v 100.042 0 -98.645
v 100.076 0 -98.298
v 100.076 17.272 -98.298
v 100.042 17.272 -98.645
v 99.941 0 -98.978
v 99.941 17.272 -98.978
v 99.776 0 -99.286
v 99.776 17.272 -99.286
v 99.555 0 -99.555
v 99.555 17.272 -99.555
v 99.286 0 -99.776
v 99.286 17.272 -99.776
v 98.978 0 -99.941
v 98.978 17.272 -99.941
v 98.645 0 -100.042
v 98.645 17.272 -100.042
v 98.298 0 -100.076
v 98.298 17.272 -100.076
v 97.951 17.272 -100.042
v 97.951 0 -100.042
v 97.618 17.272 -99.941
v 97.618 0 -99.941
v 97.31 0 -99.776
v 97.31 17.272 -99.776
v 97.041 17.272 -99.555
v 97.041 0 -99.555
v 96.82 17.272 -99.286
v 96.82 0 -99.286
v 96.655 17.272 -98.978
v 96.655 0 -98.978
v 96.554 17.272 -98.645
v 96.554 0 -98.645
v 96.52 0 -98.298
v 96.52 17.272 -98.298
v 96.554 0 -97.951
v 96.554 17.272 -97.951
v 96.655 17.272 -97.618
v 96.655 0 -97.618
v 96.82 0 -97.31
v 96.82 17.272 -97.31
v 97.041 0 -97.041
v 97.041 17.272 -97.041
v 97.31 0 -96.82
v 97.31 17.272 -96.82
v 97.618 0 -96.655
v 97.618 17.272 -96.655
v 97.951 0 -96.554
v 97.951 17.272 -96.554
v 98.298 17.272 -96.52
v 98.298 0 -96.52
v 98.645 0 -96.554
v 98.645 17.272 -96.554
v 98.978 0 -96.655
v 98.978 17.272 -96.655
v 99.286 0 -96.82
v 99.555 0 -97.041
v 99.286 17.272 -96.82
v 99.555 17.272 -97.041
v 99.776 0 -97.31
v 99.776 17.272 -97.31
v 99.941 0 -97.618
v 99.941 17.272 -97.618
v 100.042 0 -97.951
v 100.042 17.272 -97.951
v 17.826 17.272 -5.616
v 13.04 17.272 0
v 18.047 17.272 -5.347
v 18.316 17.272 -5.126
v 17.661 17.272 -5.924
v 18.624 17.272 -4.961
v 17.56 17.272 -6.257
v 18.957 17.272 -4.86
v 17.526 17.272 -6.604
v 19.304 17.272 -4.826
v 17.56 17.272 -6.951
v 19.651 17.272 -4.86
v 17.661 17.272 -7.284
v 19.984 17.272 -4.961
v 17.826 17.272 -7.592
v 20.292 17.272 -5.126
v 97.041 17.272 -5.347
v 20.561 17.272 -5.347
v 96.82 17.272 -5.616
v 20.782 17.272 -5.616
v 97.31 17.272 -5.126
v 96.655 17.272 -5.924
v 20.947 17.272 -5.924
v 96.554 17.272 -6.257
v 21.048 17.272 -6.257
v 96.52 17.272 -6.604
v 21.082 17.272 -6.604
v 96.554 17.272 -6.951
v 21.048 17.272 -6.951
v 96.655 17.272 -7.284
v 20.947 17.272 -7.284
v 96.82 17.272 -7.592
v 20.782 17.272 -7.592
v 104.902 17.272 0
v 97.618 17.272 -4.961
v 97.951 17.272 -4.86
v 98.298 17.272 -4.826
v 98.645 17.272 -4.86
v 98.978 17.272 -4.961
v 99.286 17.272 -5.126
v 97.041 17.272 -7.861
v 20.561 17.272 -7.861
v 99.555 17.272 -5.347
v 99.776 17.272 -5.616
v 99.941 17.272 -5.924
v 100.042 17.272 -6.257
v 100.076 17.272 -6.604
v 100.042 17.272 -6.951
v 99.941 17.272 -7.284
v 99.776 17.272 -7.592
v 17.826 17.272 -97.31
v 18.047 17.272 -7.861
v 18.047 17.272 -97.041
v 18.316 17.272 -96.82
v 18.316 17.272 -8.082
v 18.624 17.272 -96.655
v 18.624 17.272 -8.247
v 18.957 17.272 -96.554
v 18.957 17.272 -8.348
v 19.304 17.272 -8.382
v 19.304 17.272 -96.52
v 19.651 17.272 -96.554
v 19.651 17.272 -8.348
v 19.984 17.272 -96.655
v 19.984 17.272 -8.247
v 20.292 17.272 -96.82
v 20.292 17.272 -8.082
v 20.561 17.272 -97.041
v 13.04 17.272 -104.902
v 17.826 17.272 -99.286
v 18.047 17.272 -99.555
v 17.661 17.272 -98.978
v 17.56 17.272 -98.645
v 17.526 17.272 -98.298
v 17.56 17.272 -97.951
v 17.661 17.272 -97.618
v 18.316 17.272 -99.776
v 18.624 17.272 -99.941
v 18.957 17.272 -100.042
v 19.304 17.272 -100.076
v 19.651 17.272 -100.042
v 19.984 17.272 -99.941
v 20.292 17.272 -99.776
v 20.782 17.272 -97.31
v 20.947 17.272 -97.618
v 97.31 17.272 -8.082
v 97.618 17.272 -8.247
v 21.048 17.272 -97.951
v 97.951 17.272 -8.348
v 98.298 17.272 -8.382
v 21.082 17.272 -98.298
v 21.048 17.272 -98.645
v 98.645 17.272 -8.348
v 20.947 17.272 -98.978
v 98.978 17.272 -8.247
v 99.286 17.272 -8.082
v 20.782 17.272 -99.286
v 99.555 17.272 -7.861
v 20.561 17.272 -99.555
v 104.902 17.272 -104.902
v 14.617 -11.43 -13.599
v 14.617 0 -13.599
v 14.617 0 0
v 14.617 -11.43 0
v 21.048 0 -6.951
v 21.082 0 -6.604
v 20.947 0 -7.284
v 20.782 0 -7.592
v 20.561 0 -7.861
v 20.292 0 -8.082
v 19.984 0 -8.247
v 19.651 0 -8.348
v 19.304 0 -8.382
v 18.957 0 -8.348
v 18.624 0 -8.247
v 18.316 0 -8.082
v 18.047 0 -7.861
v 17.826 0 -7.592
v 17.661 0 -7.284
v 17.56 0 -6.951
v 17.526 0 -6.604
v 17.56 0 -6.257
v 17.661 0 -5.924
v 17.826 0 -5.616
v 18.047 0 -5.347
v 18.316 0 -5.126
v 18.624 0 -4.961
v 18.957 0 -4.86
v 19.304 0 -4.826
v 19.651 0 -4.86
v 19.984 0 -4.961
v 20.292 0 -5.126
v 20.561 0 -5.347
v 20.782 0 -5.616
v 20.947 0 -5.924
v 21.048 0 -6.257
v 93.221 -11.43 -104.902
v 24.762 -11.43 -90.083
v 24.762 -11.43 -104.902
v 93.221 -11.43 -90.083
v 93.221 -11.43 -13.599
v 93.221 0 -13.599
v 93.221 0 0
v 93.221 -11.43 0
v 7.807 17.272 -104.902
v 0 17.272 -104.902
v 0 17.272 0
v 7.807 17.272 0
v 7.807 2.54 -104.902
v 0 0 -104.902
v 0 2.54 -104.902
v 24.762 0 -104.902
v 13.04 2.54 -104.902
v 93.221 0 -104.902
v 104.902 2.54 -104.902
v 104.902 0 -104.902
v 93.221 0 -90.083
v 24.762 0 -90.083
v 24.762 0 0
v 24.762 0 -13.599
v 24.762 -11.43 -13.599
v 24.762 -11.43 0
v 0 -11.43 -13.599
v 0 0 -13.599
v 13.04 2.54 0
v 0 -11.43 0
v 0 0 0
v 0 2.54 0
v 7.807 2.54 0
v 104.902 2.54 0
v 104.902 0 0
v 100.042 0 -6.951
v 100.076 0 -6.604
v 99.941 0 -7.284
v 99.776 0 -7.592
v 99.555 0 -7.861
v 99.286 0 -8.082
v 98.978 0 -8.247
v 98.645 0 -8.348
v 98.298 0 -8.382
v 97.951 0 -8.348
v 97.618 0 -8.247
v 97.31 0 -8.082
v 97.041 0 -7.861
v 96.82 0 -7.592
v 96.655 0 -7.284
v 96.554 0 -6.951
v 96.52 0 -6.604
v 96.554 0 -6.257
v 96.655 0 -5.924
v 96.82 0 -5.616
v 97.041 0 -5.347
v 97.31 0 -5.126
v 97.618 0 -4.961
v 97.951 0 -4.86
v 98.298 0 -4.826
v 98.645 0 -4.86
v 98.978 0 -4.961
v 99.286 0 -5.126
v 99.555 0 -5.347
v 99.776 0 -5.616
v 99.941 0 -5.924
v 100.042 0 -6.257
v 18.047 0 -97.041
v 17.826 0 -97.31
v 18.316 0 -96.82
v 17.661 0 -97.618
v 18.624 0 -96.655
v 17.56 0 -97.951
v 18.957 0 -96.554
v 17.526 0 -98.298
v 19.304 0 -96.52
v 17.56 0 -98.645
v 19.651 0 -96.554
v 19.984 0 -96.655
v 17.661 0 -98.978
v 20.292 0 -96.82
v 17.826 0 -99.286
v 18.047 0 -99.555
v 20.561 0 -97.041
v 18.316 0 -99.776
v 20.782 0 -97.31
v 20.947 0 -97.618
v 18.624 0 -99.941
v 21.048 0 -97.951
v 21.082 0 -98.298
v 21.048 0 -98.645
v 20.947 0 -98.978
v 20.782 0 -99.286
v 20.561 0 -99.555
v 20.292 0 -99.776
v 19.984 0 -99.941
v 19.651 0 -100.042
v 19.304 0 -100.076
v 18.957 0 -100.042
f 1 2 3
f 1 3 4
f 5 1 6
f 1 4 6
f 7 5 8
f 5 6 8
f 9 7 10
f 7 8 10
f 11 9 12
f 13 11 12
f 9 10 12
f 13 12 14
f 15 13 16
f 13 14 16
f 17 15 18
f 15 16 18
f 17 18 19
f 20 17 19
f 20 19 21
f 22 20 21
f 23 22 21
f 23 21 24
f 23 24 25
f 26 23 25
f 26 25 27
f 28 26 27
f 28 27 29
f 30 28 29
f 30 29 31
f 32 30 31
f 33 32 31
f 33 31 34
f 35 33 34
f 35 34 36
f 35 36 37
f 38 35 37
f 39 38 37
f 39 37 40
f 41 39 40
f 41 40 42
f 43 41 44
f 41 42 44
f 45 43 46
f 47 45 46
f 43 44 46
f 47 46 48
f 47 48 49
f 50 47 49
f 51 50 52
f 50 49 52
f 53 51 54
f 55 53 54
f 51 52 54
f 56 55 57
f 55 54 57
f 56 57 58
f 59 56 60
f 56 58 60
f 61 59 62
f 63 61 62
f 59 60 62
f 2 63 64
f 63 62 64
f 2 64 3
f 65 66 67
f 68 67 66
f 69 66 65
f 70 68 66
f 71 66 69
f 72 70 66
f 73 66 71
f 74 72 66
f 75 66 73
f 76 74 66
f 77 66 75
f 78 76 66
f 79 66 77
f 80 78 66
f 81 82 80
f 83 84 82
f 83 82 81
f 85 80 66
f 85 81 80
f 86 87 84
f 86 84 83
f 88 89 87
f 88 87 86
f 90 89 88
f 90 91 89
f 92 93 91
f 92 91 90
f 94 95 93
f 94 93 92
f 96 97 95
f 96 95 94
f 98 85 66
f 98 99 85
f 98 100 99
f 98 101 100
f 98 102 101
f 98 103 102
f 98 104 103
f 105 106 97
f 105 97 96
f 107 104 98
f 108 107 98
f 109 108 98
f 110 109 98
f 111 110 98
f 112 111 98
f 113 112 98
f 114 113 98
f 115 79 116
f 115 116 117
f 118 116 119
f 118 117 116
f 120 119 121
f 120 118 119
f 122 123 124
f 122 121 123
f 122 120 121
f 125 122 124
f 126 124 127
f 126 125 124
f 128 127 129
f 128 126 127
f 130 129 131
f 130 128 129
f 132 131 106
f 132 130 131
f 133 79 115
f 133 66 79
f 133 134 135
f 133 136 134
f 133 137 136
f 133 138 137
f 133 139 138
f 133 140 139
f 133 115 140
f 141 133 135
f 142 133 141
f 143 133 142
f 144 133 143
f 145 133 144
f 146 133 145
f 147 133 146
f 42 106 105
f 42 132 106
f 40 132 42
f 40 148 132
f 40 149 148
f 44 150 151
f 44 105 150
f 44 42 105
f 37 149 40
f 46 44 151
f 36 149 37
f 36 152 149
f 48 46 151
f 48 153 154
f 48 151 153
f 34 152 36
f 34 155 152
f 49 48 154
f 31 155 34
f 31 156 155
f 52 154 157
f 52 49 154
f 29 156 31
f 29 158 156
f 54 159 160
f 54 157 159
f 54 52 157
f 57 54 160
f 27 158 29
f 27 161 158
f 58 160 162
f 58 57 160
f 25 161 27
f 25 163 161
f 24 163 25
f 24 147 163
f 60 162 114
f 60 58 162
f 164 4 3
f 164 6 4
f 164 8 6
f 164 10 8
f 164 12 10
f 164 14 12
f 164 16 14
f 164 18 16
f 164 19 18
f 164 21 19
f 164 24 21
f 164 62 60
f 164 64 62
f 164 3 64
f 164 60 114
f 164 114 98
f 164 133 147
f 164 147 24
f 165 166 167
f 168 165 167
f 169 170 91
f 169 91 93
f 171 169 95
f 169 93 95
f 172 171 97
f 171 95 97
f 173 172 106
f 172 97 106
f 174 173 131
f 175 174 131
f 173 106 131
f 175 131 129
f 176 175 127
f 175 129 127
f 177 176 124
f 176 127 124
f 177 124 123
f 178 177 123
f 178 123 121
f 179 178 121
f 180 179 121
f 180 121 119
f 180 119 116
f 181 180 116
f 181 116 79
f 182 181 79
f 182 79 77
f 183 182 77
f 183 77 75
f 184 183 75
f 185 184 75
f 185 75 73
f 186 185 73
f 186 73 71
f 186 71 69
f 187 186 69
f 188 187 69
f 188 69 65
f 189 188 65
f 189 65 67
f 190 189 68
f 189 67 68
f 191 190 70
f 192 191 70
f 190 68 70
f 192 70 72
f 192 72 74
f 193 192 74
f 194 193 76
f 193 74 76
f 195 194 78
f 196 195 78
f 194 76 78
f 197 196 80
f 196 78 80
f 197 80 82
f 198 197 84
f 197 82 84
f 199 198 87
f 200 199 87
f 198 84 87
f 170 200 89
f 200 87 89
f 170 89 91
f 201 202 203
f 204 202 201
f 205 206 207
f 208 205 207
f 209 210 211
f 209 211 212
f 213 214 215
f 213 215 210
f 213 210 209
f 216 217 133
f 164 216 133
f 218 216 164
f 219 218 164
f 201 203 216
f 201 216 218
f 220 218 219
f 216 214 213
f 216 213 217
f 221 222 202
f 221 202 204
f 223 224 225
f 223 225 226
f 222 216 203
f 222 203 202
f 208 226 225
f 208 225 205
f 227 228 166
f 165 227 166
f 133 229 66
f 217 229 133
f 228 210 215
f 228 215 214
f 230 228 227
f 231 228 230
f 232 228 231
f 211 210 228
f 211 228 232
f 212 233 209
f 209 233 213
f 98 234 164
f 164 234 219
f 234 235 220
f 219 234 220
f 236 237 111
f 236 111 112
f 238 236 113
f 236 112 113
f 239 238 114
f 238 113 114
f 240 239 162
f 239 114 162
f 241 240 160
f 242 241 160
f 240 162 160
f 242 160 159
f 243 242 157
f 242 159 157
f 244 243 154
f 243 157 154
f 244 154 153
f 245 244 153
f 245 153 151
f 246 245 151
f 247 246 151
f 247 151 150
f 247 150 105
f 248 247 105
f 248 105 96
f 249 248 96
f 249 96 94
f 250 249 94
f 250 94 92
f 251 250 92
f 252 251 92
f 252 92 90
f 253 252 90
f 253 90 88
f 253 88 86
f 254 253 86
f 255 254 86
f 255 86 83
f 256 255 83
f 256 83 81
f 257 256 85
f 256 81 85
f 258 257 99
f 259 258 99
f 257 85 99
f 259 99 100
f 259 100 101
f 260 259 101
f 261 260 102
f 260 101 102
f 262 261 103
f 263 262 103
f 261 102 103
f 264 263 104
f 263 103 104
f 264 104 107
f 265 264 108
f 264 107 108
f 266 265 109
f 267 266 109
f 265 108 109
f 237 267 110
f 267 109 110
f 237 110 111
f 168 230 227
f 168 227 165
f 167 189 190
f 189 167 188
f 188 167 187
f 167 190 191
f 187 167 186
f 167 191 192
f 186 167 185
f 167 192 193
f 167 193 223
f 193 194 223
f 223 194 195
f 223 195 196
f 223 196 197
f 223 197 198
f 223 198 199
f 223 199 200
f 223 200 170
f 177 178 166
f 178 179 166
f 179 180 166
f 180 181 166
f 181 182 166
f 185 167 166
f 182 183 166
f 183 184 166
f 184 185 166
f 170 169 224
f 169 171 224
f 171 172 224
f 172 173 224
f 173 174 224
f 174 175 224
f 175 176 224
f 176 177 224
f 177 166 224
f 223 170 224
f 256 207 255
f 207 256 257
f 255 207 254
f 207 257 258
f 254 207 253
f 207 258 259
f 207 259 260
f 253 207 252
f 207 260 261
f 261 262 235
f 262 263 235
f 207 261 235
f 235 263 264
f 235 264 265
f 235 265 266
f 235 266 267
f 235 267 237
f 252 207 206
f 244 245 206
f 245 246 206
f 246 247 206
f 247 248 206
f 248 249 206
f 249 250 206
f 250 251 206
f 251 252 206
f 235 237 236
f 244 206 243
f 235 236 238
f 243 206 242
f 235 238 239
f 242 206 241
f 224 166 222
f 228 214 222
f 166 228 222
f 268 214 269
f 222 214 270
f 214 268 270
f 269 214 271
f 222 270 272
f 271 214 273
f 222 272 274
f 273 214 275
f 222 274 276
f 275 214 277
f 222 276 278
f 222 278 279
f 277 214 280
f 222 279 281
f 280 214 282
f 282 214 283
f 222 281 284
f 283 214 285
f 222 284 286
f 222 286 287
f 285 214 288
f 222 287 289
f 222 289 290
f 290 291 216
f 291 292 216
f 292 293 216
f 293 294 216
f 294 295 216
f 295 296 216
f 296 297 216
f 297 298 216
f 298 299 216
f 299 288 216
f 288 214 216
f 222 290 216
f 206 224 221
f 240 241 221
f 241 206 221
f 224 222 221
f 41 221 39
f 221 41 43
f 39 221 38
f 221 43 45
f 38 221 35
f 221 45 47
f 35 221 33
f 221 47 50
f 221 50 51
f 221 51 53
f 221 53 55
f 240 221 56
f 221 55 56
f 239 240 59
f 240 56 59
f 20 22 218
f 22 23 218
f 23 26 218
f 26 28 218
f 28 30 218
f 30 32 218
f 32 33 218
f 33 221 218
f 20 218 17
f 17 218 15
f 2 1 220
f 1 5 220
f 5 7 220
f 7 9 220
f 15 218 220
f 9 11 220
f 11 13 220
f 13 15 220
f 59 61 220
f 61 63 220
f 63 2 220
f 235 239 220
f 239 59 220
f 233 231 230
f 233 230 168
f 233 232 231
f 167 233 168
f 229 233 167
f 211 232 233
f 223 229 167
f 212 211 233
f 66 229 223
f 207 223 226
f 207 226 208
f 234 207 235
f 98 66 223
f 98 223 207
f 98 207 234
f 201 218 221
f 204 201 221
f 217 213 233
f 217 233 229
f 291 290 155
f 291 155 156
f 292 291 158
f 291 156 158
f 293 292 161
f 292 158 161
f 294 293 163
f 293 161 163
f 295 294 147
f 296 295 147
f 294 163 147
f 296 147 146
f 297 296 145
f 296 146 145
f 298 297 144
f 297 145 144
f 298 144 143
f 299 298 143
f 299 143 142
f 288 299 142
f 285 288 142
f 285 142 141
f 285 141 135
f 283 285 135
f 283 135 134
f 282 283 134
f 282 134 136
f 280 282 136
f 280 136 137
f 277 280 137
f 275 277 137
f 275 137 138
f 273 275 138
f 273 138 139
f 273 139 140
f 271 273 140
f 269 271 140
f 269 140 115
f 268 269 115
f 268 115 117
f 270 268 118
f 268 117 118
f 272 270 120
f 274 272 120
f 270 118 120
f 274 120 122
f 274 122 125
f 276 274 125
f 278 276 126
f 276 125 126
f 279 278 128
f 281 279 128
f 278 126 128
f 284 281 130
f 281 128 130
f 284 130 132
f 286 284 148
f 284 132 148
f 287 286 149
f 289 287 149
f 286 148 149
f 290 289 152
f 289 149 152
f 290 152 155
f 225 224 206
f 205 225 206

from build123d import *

# Parameters (mm, degrees)
SKETCH1_W           = 104.902
SKETCH1_H           = 104.902
BOSS_EXTRUDE1_DEPTH = 2.54
SKETCH2_W           = 91.861923629
SKETCH2_H           = 104.902
SKETCH2_W_2         = 7.806745179
BOSS_EXTRUDE2_DEPTH = 14.732
SKETCH3_R           = 1.778
CUT_EXTRUDE1_DEPTH  = 18.272
SKETCH4_W           = 68.459098584
SKETCH4_H           = 14.819221787
SKETCH4_H_2         = 13.598803865
SKETCH4_W_2         = 14.616932407
BOSS_EXTRUDE3_DEPTH = 11.43


with BuildPart() as part:
    # Sketch1 → Boss-Extrude1 (new body)
    with BuildSketch(Plane(origin=(0, 0, 0), x_dir=(1, 0, 0), z_dir=(0, 1, 0))):
        with Locations((52.451, 52.451)):
            Rectangle(SKETCH1_W, SKETCH1_H)
    extrude(amount=BOSS_EXTRUDE1_DEPTH)

    # Sketch2 → Boss-Extrude2 (add)
    with BuildSketch(Plane(origin=(0, 2.54, 0), x_dir=(1, 0, 0), z_dir=(0, 1, 0))):
        with Locations((58.971038185, 52.451)):
            Rectangle(SKETCH2_W, SKETCH2_H)
        with Locations((3.90337259, 52.451)):
            Rectangle(SKETCH2_W_2, SKETCH2_H)
    extrude(amount=BOSS_EXTRUDE2_DEPTH)

    # Sketch3 → Cut-Extrude1 (cut, through all)
    with BuildSketch(Plane(origin=(0, 17.272, 0), x_dir=(1, 0, 0), z_dir=(0, 1, 0))):
        with Locations((98.298, 6.604)):
            Circle(SKETCH3_R)
        with Locations((98.298, 98.298)):
            Circle(SKETCH3_R)
        with Locations((19.304, 6.604)):
            Circle(SKETCH3_R)
        with Locations((19.304, 98.298)):
            Circle(SKETCH3_R)
    extrude(amount=-CUT_EXTRUDE1_DEPTH, mode=Mode.SUBTRACT)

    # Sketch4 → Boss-Extrude3 (add)
    with BuildSketch(Plane.XZ):
        with Locations((58.99120595, -97.492389107)):
            Rectangle(SKETCH4_W, SKETCH4_H)
        with Locations((58.99120595, -6.799401933)):
            Rectangle(SKETCH4_W, SKETCH4_H_2)
        with Locations((7.308466204, -6.799401933)):
            Rectangle(SKETCH4_W_2, SKETCH4_H_2)
    extrude(amount=BOSS_EXTRUDE3_DEPTH)


solid = part.part
